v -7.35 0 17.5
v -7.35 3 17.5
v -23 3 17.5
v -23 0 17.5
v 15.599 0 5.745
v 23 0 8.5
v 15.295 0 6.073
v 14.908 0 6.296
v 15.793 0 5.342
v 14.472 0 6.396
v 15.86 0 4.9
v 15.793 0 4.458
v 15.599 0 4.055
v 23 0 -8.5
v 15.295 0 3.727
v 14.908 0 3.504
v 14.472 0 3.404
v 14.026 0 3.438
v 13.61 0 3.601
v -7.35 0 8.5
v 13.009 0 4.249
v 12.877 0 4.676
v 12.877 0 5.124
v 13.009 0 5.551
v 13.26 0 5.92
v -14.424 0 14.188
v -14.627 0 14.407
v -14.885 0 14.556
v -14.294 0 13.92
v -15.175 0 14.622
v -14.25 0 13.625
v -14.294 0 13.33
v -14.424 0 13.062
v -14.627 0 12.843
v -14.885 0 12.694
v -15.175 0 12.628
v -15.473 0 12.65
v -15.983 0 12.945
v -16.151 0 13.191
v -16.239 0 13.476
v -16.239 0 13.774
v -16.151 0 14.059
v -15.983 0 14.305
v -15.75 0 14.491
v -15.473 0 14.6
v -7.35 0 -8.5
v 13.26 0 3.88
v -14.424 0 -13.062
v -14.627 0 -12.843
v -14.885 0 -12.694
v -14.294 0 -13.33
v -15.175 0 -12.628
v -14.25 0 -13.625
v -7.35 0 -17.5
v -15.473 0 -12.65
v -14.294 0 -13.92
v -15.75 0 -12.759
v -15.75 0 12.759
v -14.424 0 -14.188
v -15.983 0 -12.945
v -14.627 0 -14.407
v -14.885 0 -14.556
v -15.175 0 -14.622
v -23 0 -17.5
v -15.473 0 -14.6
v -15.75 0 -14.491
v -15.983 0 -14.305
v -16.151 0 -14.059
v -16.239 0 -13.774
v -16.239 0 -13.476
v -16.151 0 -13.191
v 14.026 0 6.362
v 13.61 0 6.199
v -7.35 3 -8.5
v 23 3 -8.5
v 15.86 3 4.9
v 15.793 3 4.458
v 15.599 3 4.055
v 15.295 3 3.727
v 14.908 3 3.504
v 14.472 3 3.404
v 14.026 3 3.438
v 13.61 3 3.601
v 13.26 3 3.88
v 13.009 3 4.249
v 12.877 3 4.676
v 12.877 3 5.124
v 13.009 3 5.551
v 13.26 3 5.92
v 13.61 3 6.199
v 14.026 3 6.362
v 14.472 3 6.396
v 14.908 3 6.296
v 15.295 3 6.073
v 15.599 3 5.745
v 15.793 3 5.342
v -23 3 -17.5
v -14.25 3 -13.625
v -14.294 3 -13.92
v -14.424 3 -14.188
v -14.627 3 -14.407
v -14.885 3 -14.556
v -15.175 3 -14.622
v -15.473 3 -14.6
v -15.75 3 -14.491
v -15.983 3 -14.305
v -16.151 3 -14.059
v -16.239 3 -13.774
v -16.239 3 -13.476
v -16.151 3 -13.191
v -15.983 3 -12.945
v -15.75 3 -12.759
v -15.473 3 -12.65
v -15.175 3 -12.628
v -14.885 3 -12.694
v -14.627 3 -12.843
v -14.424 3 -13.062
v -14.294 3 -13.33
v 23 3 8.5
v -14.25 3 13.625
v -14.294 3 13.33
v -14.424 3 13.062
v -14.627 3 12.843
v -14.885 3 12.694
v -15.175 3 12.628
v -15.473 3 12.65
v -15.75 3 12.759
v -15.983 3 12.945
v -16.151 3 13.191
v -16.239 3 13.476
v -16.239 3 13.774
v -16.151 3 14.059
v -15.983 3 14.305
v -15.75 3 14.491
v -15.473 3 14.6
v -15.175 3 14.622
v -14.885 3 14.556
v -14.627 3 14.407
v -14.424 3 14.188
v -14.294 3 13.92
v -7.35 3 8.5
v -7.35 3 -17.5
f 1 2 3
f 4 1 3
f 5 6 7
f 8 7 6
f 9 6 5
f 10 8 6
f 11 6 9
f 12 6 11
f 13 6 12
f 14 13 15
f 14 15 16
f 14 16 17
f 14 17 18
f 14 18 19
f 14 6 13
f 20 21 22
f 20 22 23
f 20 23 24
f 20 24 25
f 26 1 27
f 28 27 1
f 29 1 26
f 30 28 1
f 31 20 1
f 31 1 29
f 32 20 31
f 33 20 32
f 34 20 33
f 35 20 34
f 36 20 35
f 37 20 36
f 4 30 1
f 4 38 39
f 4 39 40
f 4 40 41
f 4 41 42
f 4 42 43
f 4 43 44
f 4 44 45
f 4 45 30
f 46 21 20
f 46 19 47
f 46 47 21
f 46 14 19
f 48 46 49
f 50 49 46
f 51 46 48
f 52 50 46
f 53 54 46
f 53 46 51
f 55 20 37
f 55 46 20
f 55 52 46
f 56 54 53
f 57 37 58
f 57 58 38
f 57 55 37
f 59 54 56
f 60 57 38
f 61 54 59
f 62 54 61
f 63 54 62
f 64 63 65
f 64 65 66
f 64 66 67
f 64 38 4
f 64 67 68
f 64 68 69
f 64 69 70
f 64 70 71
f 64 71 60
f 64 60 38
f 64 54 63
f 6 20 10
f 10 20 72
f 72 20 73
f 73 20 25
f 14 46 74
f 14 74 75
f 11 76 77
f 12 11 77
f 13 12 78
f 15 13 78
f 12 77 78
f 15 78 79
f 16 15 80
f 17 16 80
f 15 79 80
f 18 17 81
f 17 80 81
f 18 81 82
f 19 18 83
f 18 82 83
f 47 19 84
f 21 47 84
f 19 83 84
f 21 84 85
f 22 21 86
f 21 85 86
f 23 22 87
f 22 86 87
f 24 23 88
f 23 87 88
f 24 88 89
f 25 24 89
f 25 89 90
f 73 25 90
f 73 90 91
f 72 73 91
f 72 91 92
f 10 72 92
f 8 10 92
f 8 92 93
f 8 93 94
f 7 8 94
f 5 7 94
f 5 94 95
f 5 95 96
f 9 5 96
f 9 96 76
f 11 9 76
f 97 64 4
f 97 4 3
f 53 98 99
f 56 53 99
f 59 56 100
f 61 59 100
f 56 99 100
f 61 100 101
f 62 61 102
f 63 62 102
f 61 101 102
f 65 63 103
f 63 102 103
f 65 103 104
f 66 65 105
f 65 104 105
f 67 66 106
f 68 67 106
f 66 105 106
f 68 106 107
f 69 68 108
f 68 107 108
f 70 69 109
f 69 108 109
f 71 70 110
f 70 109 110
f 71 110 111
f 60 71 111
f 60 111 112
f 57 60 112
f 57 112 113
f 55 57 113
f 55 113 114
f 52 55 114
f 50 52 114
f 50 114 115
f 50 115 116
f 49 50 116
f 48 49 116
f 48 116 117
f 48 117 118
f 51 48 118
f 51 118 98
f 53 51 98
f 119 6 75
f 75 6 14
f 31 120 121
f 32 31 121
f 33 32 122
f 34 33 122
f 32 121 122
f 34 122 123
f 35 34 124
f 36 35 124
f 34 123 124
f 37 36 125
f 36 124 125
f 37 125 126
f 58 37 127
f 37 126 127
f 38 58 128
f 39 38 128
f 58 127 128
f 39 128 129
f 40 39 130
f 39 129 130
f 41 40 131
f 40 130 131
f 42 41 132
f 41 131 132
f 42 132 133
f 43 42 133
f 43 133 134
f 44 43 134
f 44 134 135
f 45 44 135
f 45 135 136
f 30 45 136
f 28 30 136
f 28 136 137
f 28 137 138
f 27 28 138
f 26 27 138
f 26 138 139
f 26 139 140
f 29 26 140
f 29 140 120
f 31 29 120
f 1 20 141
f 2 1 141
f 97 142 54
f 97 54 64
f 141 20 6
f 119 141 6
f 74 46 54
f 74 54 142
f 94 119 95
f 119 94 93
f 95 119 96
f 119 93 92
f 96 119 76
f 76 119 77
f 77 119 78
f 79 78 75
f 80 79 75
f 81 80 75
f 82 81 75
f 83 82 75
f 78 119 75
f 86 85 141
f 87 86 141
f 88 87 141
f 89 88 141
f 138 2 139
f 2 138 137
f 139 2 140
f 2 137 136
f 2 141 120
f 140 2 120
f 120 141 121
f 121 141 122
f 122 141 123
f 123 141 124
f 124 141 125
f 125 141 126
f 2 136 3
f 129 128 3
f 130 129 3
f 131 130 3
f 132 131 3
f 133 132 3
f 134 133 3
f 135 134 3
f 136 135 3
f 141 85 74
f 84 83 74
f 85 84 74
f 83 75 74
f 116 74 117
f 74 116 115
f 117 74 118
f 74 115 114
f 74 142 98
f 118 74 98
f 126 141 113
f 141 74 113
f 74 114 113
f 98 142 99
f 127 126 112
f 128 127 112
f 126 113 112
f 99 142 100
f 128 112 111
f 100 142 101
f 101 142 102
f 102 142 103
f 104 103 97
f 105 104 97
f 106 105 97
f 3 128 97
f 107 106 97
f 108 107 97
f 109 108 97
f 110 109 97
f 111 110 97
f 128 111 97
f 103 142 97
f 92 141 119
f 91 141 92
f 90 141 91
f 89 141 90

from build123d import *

# Parameters (mm, degrees)
SKETCH1_W           = 46
SKETCH1_H           = 17
BOSS_EXTRUDE1_DEPTH = 3
SKETCH2_W           = 15.65
SKETCH2_H           = 3
BOSS_EXTRUDE2_DEPTH = 9
SKETCH3_R           = 1
CUT_EXTRUDE1_DEPTH  = 10
SKETCH4_R           = 1.5
CUT_EXTRUDE2_DEPTH  = 10


with BuildPart() as part:
    # Sketch1 → Boss-Extrude1 (new body)
    with BuildSketch(Plane(origin=(0, 0, 0), x_dir=(1, 0, 0), z_dir=(0, 1, 0))):
        Rectangle(SKETCH1_W, SKETCH1_H)
    extrude(amount=BOSS_EXTRUDE1_DEPTH)

    # Sketch2 → Boss-Extrude2 (add)
    with BuildSketch(Plane(origin=(0, 0, -8.5), x_dir=(-1, 0, 0), z_dir=(0, 0, -1))):
        with Locations((15.175, 1.5)):
            Rectangle(SKETCH2_W, SKETCH2_H)
    boss_extrude2 = extrude(amount=BOSS_EXTRUDE2_DEPTH)

    # Mirror1: Boss-Extrude2 across plane
    add(boss_extrude2.mirror(Plane.XY))

    # Sketch3 → Cut-Extrude1 (cut)
    with BuildSketch(Plane(origin=(0, 3, 0), x_dir=(1, 0, 0), z_dir=(0, 1, 0))):
        with Locations((-15.25, 13.625)):
            Circle(SKETCH3_R)
        with Locations((-15.25, -13.625)):
            Circle(SKETCH3_R)
    extrude(amount=-CUT_EXTRUDE1_DEPTH, mode=Mode.SUBTRACT)

    # Sketch4 → Cut-Extrude2 (cut)
    with BuildSketch(Plane(origin=(0, 3, 0), x_dir=(1, 0, 0), z_dir=(0, 1, 0))):
        with Locations((14.36, -4.9)):
            Circle(SKETCH4_R)
    extrude(amount=-CUT_EXTRUDE2_DEPTH, mode=Mode.SUBTRACT)


solid = part.part
